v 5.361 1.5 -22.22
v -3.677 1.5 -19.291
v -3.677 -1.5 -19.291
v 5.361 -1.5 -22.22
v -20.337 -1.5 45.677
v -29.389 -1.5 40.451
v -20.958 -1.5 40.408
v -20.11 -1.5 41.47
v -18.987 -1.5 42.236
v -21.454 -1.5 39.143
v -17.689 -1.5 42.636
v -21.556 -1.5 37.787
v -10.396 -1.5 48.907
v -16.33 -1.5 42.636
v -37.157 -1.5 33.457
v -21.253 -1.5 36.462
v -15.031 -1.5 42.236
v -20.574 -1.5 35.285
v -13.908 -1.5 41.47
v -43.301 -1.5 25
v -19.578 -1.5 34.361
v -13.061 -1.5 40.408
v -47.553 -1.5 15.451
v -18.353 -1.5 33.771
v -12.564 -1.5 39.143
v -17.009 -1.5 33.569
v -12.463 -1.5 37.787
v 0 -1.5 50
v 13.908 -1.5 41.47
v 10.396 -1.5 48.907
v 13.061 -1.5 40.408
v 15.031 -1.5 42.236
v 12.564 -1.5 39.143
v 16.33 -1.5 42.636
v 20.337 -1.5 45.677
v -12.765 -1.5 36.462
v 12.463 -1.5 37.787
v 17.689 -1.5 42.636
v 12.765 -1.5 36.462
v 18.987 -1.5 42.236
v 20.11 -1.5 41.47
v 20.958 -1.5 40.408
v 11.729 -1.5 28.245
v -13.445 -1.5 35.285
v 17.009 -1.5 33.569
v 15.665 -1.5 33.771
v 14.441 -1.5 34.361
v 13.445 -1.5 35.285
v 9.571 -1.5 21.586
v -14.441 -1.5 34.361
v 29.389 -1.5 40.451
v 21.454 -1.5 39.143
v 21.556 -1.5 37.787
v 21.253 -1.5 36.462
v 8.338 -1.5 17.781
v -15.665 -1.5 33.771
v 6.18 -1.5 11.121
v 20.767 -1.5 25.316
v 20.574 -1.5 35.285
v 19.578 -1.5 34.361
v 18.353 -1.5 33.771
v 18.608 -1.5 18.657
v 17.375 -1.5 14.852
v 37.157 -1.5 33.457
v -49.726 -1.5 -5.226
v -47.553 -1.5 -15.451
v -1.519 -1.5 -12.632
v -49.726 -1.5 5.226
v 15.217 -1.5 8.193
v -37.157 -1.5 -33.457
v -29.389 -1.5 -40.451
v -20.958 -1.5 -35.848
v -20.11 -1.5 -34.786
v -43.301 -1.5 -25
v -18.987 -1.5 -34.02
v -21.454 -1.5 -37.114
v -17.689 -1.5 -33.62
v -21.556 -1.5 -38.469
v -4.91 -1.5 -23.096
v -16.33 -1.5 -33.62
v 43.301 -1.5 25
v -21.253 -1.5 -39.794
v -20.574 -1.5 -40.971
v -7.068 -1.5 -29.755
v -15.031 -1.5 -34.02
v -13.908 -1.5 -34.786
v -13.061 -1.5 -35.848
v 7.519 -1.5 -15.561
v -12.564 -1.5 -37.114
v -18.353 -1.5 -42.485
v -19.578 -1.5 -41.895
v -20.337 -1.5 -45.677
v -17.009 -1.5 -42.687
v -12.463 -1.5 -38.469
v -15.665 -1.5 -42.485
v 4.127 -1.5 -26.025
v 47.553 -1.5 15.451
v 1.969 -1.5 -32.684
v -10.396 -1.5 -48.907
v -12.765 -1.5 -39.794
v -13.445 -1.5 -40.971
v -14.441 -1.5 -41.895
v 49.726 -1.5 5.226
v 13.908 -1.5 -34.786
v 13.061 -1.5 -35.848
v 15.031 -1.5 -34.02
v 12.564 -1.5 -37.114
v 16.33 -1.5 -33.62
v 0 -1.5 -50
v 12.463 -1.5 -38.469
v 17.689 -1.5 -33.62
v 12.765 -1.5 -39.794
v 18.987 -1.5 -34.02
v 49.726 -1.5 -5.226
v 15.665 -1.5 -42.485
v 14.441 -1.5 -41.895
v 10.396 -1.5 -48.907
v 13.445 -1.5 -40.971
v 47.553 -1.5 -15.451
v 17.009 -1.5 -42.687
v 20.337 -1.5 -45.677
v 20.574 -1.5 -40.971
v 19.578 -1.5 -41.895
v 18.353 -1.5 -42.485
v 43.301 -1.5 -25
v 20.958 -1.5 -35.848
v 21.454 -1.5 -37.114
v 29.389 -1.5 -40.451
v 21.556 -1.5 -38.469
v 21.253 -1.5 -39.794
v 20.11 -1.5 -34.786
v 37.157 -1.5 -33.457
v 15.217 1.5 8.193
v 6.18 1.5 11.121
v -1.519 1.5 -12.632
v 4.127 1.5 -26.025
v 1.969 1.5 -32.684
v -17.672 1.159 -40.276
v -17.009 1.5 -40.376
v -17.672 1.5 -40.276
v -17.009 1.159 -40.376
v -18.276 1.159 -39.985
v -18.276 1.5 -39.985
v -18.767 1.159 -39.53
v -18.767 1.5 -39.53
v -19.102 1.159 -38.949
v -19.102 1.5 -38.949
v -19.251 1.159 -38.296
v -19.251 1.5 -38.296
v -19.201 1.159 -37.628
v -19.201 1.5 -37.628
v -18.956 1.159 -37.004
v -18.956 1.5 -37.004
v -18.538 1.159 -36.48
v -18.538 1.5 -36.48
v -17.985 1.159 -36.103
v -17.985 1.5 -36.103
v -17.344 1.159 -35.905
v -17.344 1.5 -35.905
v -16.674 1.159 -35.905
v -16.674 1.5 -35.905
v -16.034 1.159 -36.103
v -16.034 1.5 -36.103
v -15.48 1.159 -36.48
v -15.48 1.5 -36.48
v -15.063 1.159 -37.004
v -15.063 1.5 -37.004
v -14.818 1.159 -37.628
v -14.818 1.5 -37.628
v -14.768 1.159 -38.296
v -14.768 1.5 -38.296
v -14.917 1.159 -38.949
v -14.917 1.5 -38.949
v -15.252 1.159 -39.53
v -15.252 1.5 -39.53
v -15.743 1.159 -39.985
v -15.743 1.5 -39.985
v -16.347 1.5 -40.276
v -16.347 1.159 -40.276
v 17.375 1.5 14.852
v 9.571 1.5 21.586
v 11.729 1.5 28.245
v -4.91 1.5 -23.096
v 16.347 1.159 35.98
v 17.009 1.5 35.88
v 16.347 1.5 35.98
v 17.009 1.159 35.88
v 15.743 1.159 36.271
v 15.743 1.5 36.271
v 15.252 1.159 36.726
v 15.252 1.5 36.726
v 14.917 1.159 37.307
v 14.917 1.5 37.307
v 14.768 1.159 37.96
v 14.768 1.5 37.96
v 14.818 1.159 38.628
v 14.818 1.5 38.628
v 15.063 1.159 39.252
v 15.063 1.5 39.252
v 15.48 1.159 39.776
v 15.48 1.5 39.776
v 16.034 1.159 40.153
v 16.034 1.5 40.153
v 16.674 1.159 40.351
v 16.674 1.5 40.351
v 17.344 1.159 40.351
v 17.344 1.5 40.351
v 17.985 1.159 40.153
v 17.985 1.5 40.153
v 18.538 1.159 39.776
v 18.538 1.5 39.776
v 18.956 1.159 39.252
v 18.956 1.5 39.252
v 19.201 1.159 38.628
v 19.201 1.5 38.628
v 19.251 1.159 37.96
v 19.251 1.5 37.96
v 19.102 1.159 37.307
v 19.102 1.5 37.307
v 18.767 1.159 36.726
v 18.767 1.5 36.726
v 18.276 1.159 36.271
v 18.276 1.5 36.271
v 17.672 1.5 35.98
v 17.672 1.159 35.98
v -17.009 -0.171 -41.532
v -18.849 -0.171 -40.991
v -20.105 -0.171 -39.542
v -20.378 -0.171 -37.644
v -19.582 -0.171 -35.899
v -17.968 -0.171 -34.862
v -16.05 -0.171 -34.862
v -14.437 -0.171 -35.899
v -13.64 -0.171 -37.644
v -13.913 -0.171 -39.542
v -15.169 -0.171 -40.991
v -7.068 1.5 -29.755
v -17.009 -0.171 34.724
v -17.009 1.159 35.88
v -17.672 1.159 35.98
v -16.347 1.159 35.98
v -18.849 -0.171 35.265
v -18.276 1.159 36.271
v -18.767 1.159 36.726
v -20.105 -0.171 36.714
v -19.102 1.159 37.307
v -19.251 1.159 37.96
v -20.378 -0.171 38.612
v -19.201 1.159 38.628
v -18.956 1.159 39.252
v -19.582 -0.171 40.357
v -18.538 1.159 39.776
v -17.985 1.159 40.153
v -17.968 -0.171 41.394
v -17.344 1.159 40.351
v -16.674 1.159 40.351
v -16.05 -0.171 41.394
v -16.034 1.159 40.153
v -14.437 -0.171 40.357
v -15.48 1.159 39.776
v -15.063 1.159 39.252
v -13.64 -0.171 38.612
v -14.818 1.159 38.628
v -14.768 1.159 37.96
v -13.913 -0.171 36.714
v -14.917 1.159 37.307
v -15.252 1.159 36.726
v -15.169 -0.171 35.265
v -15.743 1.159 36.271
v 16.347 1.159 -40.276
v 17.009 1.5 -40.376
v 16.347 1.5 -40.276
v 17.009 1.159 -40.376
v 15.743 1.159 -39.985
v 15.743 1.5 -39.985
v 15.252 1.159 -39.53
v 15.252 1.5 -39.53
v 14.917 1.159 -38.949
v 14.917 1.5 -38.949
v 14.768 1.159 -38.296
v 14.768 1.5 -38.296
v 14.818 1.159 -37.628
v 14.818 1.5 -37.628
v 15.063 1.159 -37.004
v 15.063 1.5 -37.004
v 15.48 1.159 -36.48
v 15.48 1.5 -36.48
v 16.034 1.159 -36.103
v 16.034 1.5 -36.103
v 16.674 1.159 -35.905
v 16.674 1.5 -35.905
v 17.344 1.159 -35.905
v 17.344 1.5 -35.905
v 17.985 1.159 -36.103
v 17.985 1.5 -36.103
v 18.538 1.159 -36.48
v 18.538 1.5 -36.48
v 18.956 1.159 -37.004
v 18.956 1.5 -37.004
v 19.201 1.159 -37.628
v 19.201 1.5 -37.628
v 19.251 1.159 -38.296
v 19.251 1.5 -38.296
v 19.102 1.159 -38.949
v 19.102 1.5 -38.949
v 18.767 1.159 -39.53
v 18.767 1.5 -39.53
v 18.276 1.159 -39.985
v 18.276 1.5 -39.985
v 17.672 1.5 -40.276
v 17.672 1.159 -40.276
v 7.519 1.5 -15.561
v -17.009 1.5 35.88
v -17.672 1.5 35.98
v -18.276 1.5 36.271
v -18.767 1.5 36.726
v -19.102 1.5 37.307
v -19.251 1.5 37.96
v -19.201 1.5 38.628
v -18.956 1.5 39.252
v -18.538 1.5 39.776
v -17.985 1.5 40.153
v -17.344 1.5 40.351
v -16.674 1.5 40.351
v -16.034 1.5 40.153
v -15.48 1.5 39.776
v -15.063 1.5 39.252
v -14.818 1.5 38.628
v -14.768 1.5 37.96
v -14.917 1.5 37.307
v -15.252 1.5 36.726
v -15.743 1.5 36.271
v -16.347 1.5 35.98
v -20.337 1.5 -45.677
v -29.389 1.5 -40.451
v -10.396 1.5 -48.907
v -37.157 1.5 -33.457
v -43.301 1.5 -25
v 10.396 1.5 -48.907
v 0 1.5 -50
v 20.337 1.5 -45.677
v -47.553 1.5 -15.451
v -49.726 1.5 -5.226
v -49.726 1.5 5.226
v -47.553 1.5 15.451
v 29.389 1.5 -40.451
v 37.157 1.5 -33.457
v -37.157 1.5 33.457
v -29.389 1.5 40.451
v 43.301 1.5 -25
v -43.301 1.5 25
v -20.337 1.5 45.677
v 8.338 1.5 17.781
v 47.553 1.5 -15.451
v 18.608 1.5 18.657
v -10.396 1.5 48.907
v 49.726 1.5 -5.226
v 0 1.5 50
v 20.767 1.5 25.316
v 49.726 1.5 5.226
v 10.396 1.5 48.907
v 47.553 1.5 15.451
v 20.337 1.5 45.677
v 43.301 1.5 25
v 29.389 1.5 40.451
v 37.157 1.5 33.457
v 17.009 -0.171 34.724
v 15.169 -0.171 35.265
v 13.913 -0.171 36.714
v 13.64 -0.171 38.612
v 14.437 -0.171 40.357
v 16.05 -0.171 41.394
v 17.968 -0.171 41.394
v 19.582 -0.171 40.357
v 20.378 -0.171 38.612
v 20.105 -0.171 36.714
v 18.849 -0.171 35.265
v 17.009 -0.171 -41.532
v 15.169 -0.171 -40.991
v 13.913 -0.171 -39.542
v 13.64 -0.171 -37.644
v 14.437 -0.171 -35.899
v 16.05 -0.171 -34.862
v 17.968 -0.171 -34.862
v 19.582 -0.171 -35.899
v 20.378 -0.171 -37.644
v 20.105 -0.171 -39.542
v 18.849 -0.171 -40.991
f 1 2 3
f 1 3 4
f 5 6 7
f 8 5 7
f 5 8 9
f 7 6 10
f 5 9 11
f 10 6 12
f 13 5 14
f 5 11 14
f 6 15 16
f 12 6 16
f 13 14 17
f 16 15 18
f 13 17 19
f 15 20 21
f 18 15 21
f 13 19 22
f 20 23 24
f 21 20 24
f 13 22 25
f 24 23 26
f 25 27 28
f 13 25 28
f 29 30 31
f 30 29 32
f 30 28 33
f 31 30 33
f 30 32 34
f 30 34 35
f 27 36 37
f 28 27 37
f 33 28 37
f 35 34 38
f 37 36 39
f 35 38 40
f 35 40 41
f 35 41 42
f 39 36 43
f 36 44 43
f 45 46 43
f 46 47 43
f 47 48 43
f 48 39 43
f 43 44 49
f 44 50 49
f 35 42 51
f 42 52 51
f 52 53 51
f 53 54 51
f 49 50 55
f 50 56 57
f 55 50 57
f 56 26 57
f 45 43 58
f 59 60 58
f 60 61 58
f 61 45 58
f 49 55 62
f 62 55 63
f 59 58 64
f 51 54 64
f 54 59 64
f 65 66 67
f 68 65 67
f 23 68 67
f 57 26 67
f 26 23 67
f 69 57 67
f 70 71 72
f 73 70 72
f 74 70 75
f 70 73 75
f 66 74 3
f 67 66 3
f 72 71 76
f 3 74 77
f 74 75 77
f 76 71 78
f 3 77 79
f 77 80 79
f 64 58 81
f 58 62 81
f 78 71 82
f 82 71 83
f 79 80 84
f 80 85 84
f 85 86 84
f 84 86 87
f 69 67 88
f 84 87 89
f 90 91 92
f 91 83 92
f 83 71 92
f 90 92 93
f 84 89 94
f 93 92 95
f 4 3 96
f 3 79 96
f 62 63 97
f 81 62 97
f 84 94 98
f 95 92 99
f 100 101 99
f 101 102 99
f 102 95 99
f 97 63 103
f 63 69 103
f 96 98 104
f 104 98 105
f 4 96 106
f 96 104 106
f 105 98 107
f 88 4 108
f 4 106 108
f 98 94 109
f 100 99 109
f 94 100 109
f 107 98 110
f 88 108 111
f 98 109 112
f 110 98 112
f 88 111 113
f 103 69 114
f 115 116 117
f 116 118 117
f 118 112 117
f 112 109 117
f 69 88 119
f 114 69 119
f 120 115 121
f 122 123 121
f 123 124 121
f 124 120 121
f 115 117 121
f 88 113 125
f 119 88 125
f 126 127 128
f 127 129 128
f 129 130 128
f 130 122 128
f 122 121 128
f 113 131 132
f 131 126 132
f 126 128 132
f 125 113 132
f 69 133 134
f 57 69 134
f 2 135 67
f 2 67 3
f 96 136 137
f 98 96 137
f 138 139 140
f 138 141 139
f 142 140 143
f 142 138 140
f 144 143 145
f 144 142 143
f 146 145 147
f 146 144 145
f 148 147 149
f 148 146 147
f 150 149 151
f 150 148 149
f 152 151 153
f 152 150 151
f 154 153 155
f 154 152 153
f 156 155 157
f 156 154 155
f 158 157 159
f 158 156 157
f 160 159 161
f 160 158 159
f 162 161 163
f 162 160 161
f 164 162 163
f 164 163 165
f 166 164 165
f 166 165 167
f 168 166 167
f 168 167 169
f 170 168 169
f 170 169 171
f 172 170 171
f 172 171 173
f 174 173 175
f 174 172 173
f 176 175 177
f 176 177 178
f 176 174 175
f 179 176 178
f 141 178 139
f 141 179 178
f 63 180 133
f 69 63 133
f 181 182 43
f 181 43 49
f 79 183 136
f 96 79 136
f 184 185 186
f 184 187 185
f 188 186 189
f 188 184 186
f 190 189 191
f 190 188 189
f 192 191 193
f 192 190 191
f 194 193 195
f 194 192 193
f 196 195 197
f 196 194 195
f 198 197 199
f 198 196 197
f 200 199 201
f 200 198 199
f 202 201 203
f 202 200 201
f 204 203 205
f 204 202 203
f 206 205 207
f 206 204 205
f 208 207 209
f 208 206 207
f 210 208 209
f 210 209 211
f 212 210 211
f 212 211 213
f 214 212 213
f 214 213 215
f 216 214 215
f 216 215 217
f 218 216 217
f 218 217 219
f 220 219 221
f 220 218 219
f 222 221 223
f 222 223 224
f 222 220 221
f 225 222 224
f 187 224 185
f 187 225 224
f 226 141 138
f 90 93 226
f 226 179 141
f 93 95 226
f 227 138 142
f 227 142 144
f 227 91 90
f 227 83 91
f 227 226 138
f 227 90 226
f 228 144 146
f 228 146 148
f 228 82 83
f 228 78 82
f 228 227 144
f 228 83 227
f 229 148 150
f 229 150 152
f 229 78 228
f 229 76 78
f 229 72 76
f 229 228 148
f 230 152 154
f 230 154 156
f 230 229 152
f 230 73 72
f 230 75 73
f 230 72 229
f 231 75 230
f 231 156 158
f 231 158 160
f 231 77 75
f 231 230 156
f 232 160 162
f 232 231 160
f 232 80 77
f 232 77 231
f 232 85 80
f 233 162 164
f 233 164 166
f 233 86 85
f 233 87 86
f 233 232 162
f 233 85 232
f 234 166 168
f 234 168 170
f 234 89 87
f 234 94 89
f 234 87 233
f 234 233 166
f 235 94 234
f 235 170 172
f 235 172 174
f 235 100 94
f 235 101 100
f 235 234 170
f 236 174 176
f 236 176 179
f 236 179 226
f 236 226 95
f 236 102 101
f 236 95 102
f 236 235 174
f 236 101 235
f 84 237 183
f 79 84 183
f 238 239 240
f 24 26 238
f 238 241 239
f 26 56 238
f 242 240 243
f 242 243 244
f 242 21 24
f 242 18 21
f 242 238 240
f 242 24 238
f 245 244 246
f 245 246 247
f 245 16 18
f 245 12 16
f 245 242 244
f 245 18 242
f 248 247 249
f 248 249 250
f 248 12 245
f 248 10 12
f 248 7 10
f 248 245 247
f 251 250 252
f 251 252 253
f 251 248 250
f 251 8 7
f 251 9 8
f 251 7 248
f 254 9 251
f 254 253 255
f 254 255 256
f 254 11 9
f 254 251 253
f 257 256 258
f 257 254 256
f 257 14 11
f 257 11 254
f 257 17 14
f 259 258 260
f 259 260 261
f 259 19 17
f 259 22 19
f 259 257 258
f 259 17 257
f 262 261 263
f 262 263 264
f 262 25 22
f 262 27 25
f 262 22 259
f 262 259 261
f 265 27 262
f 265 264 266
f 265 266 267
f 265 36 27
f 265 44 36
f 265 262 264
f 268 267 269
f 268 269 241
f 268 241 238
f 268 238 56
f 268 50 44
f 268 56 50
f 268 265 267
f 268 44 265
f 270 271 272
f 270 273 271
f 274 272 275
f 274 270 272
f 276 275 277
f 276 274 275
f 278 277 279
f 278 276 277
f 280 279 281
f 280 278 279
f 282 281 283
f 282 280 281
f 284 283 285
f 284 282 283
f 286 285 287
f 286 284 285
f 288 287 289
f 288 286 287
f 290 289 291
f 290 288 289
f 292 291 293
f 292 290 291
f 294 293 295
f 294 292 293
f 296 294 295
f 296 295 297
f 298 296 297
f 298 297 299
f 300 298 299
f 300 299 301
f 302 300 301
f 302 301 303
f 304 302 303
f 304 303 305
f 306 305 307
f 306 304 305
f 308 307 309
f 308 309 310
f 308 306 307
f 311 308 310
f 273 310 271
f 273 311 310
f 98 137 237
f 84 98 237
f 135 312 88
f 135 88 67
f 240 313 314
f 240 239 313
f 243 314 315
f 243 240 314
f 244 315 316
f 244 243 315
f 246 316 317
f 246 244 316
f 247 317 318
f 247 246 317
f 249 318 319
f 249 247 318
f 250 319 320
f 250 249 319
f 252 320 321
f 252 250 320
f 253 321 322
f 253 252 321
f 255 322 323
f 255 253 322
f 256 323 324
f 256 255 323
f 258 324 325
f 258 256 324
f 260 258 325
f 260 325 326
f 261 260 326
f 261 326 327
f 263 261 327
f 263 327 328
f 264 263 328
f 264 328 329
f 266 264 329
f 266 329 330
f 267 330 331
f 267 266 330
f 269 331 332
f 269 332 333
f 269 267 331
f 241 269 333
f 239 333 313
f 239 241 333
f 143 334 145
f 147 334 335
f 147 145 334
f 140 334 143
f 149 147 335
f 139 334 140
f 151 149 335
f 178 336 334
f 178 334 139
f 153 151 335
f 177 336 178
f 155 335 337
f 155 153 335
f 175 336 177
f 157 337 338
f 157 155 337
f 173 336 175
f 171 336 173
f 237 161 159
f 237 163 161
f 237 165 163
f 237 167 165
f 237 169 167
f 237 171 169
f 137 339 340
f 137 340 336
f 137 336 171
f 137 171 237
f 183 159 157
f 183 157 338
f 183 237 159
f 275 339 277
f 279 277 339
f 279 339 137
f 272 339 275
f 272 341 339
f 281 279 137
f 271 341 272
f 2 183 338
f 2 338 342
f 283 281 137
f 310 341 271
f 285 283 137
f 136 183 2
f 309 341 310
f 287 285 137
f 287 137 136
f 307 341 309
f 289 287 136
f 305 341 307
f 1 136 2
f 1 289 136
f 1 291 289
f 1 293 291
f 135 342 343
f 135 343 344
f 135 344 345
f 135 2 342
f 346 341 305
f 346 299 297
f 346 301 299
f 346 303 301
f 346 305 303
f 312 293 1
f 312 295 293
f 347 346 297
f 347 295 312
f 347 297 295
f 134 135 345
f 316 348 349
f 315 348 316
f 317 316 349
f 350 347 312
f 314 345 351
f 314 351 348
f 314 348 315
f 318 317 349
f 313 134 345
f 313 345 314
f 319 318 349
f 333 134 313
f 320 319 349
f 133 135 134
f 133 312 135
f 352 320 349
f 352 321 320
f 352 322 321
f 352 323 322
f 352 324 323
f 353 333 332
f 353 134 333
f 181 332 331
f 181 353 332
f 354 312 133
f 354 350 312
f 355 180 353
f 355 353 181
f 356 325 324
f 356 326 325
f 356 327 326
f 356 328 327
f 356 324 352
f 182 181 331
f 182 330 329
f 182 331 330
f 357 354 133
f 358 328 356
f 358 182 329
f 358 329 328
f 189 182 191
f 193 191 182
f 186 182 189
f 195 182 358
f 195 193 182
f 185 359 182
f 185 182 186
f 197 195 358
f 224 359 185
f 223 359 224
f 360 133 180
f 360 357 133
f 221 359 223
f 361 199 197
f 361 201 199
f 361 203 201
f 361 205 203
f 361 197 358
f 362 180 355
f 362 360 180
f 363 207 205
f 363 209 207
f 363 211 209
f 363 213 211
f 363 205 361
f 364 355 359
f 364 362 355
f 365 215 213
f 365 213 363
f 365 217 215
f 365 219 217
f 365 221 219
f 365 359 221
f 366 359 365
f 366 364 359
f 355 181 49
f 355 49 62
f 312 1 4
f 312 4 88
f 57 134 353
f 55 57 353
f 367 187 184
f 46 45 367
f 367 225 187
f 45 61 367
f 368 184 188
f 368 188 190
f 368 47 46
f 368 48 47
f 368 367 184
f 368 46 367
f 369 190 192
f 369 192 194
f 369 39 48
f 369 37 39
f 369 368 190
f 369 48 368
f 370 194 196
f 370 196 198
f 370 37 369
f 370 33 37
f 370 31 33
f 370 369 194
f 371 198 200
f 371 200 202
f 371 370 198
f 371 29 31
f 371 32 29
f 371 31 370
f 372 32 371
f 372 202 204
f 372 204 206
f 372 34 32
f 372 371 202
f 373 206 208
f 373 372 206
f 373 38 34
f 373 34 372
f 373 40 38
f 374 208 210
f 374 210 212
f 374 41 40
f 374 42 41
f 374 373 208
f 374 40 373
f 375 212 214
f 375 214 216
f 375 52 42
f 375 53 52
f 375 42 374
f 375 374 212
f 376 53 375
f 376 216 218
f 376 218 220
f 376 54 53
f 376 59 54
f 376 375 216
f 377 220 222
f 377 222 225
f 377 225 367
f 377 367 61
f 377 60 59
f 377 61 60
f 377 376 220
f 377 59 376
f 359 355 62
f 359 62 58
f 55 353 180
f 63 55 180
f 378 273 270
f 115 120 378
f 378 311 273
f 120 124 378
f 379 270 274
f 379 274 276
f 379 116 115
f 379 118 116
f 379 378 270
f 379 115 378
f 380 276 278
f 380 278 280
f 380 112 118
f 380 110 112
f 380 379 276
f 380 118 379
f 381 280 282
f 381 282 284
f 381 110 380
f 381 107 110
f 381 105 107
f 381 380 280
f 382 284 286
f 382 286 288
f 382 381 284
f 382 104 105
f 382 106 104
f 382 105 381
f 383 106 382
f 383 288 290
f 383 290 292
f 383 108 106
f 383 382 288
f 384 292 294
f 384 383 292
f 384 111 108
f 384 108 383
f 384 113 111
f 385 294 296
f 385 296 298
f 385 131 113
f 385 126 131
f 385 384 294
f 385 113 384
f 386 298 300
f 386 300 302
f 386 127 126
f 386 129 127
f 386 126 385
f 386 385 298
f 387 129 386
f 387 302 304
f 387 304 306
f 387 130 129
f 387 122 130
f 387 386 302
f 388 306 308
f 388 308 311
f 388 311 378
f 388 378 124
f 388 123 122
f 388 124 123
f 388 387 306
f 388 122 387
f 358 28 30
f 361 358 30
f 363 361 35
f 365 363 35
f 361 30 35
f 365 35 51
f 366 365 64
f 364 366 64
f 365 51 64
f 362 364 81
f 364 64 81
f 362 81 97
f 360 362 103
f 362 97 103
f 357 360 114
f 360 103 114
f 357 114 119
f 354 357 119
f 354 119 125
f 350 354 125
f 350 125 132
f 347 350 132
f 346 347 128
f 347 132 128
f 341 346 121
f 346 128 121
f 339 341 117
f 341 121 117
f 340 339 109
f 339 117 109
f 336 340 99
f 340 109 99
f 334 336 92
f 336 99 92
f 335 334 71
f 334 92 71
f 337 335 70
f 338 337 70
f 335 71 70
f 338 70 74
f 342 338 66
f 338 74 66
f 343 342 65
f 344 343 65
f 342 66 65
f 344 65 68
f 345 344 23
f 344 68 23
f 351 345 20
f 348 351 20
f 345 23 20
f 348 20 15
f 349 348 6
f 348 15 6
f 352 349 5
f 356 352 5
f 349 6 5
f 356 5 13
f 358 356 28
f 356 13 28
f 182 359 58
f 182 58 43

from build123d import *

# Parameters (mm, degrees)
A_BASE_T_START                                = -1.5
A_BASE_T_OUTLINE_R                            = 47
A_BASE_T_OUTLINE_R_2                          = 1
A_BASE_T_DEPTH                                = 3
BASE_PULLEY_CUTOUT_DEPTH                      = 67.535704701
OUTER_START                                   = -3
SKETCH2_R                                     = 50
SKETCH2_R_2                                   = 47
OUTER_RING_DEPTH                              = 3
PATCHING_START                                = -3
SKETCH3_R                                     = 1
PATCHING_DEPTH                                = 3
CSK_FOR_8_FLAT_HEAD_SOCKET_CAP_SCREW1_A_COUNT = 2
CSK_FOR_8_FLAT_HEAD_SOCKET_CAP_SCREW1_A_PITCH = 34.018518517
CSK_FOR_8_FLAT_HEAD_SOCKET_CAP_SCRE_2_COUNT   = 2
CSK_FOR_8_FLAT_HEAD_SOCKET_CAP_SCRE_2_PITCH   = 83.5
CSK_FOR_8_FLAT_HEAD_SOCKET_CAP_SCRE_3_COUNT   = 2
CSK_FOR_8_FLAT_HEAD_SOCKET_CAP_SCRE_3_PITCH   = 76.256084334


# Read off the part's stored shape, not the designer's step: a_base_t
with BuildPart() as part:
    # a_base_t outline → a_base_t (new body)
    with BuildSketch(Plane(origin=(0, 0, 0), x_dir=(1, 0, 0), z_dir=(0, 1, 0)).offset(A_BASE_T_START)):
        Circle(A_BASE_T_OUTLINE_R)
        with Locations((-17.009259258, -38.128042167)):
            Circle(A_BASE_T_OUTLINE_R_2, mode=Mode.SUBTRACT)
        with Locations((-9.166666665, -28.284271247)):
            Circle(A_BASE_T_OUTLINE_R_2, mode=Mode.SUBTRACT)
        with Locations((17.009259258, -38.128042167)):
            Circle(A_BASE_T_OUTLINE_R_2, mode=Mode.SUBTRACT)
        with Locations((27.5, -28.284271247)):
            Circle(A_BASE_T_OUTLINE_R_2, mode=Mode.SUBTRACT)
        with Locations((-27.5, 28.284271247)):
            Circle(A_BASE_T_OUTLINE_R_2, mode=Mode.SUBTRACT)
        with Locations((-17.009259258, 38.128042167)):
            Circle(A_BASE_T_OUTLINE_R_2, mode=Mode.SUBTRACT)
        with Locations((9.166666665, 28.284271247)):
            Circle(A_BASE_T_OUTLINE_R_2, mode=Mode.SUBTRACT)
        with Locations((17.009259258, 38.128042167)):
            Circle(A_BASE_T_OUTLINE_R_2, mode=Mode.SUBTRACT)
    extrude(amount=A_BASE_T_DEPTH)

    # Sketch1 → Base Pulley Cutout (cut, through all)
    with BuildSketch(Plane(origin=(0, 1.5, 0), x_dir=(1, 0, 0), z_dir=(0, 1, 0))):
        Polygon((8.337949793, -17.780503881), (17.375186195, -14.85162044), (15.217061554, -8.192604143), (6.179825152, -11.121487584), align=None)
        Polygon((9.571163873, -21.58565605), (18.608400275, -18.656772609), (20.766524916, -25.315788906), (11.729288514, -28.244672346), align=None)
        Polygon((7.518722658, 15.561058274), (-1.518513745, 12.632174833), (-3.676638385, 19.291191129), (5.360598017, 22.22007457), align=None)
        Polygon((-4.909852466, 23.096343299), (4.127383937, 26.025226739), (1.969259296, 32.684243036), (-7.067977106, 29.755359595), align=None)
    extrude(amount=-BASE_PULLEY_CUTOUT_DEPTH, mode=Mode.SUBTRACT)

    # Sketch2 → Outer Ring (add)
    with BuildSketch(Plane(origin=(0, 1.5, 0), x_dir=(1, 0, 0), z_dir=(0, 1, 0)).offset(OUTER_START)):
        with Locations(Location((0, 0, 0), (0, 0, 270))):
            Circle(SKETCH2_R)
        Circle(SKETCH2_R_2, mode=Mode.SUBTRACT)
    extrude(amount=OUTER_RING_DEPTH)

    # Sketch3 → Patching (add)
    with BuildSketch(Plane(origin=(0, 1.5, 0), x_dir=(1, 0, 0), z_dir=(0, 1, 0)).offset(PATCHING_START)):
        with Locations((-9.166666665, -28.284271247)):
            Circle(SKETCH3_R)
        with Locations((-27.5, 28.284271247)):
            Circle(SKETCH3_R)
        with Locations((9.166666665, 28.284271247)):
            Circle(SKETCH3_R)
        with Locations((27.5, -28.284271247)):
            Circle(SKETCH3_R)
    extrude(amount=PATCHING_DEPTH)

    # Sketch6 → CSK for #8 Flat Head Socket Cap Screw1 (revolve, cut)
    with BuildSketch(Plane(origin=(17.009259258, -1.5, 38.128042167), x_dir=(0, 0, -1), z_dir=(1, 0, 0))):
        Polygon((0, 0), (0, 3), (2.2479, 3), (2.2479, 2.658961536), (4.5593, 0), align=None)
    csk_for_8_flat_head_socket_cap_screw1 = revolve(axis=Axis((17.009259258, -7.85, 38.128042167), (0, 1, 0)), mode=Mode.SUBTRACT)

    # CSK for #8 Flat Head Socket Cap Screw1 a: CSK for #8 Flat Head Socket Cap Screw1 ×2
    with Locations(*[(-i * CSK_FOR_8_FLAT_HEAD_SOCKET_CAP_SCREW1_A_PITCH, 0, 0) for i in range(1, CSK_FOR_8_FLAT_HEAD_SOCKET_CAP_SCREW1_A_COUNT)]):
        add(csk_for_8_flat_head_socket_cap_screw1, mode=Mode.SUBTRACT)

    # CSK for _8 Flat Head Socket Cap Scre 2: CSK for #8 Flat Head Socket Cap Screw1 ×2
    with Locations(*[Vector(-0.40740740738888753, 0, -0.9132465189666288) * (i * CSK_FOR_8_FLAT_HEAD_SOCKET_CAP_SCRE_2_PITCH) for i in range(1, CSK_FOR_8_FLAT_HEAD_SOCKET_CAP_SCRE_2_COUNT)]):
        add(csk_for_8_flat_head_socket_cap_screw1, mode=Mode.SUBTRACT)

    # CSK for _8 Flat Head Socket Cap Scre 3: CSK for #8 Flat Head Socket Cap Screw1 ×2
    with Locations(*[(0, 0, -i * CSK_FOR_8_FLAT_HEAD_SOCKET_CAP_SCRE_3_PITCH) for i in range(1, CSK_FOR_8_FLAT_HEAD_SOCKET_CAP_SCRE_3_COUNT)]):
        add(csk_for_8_flat_head_socket_cap_screw1, mode=Mode.SUBTRACT)


solid = part.part
